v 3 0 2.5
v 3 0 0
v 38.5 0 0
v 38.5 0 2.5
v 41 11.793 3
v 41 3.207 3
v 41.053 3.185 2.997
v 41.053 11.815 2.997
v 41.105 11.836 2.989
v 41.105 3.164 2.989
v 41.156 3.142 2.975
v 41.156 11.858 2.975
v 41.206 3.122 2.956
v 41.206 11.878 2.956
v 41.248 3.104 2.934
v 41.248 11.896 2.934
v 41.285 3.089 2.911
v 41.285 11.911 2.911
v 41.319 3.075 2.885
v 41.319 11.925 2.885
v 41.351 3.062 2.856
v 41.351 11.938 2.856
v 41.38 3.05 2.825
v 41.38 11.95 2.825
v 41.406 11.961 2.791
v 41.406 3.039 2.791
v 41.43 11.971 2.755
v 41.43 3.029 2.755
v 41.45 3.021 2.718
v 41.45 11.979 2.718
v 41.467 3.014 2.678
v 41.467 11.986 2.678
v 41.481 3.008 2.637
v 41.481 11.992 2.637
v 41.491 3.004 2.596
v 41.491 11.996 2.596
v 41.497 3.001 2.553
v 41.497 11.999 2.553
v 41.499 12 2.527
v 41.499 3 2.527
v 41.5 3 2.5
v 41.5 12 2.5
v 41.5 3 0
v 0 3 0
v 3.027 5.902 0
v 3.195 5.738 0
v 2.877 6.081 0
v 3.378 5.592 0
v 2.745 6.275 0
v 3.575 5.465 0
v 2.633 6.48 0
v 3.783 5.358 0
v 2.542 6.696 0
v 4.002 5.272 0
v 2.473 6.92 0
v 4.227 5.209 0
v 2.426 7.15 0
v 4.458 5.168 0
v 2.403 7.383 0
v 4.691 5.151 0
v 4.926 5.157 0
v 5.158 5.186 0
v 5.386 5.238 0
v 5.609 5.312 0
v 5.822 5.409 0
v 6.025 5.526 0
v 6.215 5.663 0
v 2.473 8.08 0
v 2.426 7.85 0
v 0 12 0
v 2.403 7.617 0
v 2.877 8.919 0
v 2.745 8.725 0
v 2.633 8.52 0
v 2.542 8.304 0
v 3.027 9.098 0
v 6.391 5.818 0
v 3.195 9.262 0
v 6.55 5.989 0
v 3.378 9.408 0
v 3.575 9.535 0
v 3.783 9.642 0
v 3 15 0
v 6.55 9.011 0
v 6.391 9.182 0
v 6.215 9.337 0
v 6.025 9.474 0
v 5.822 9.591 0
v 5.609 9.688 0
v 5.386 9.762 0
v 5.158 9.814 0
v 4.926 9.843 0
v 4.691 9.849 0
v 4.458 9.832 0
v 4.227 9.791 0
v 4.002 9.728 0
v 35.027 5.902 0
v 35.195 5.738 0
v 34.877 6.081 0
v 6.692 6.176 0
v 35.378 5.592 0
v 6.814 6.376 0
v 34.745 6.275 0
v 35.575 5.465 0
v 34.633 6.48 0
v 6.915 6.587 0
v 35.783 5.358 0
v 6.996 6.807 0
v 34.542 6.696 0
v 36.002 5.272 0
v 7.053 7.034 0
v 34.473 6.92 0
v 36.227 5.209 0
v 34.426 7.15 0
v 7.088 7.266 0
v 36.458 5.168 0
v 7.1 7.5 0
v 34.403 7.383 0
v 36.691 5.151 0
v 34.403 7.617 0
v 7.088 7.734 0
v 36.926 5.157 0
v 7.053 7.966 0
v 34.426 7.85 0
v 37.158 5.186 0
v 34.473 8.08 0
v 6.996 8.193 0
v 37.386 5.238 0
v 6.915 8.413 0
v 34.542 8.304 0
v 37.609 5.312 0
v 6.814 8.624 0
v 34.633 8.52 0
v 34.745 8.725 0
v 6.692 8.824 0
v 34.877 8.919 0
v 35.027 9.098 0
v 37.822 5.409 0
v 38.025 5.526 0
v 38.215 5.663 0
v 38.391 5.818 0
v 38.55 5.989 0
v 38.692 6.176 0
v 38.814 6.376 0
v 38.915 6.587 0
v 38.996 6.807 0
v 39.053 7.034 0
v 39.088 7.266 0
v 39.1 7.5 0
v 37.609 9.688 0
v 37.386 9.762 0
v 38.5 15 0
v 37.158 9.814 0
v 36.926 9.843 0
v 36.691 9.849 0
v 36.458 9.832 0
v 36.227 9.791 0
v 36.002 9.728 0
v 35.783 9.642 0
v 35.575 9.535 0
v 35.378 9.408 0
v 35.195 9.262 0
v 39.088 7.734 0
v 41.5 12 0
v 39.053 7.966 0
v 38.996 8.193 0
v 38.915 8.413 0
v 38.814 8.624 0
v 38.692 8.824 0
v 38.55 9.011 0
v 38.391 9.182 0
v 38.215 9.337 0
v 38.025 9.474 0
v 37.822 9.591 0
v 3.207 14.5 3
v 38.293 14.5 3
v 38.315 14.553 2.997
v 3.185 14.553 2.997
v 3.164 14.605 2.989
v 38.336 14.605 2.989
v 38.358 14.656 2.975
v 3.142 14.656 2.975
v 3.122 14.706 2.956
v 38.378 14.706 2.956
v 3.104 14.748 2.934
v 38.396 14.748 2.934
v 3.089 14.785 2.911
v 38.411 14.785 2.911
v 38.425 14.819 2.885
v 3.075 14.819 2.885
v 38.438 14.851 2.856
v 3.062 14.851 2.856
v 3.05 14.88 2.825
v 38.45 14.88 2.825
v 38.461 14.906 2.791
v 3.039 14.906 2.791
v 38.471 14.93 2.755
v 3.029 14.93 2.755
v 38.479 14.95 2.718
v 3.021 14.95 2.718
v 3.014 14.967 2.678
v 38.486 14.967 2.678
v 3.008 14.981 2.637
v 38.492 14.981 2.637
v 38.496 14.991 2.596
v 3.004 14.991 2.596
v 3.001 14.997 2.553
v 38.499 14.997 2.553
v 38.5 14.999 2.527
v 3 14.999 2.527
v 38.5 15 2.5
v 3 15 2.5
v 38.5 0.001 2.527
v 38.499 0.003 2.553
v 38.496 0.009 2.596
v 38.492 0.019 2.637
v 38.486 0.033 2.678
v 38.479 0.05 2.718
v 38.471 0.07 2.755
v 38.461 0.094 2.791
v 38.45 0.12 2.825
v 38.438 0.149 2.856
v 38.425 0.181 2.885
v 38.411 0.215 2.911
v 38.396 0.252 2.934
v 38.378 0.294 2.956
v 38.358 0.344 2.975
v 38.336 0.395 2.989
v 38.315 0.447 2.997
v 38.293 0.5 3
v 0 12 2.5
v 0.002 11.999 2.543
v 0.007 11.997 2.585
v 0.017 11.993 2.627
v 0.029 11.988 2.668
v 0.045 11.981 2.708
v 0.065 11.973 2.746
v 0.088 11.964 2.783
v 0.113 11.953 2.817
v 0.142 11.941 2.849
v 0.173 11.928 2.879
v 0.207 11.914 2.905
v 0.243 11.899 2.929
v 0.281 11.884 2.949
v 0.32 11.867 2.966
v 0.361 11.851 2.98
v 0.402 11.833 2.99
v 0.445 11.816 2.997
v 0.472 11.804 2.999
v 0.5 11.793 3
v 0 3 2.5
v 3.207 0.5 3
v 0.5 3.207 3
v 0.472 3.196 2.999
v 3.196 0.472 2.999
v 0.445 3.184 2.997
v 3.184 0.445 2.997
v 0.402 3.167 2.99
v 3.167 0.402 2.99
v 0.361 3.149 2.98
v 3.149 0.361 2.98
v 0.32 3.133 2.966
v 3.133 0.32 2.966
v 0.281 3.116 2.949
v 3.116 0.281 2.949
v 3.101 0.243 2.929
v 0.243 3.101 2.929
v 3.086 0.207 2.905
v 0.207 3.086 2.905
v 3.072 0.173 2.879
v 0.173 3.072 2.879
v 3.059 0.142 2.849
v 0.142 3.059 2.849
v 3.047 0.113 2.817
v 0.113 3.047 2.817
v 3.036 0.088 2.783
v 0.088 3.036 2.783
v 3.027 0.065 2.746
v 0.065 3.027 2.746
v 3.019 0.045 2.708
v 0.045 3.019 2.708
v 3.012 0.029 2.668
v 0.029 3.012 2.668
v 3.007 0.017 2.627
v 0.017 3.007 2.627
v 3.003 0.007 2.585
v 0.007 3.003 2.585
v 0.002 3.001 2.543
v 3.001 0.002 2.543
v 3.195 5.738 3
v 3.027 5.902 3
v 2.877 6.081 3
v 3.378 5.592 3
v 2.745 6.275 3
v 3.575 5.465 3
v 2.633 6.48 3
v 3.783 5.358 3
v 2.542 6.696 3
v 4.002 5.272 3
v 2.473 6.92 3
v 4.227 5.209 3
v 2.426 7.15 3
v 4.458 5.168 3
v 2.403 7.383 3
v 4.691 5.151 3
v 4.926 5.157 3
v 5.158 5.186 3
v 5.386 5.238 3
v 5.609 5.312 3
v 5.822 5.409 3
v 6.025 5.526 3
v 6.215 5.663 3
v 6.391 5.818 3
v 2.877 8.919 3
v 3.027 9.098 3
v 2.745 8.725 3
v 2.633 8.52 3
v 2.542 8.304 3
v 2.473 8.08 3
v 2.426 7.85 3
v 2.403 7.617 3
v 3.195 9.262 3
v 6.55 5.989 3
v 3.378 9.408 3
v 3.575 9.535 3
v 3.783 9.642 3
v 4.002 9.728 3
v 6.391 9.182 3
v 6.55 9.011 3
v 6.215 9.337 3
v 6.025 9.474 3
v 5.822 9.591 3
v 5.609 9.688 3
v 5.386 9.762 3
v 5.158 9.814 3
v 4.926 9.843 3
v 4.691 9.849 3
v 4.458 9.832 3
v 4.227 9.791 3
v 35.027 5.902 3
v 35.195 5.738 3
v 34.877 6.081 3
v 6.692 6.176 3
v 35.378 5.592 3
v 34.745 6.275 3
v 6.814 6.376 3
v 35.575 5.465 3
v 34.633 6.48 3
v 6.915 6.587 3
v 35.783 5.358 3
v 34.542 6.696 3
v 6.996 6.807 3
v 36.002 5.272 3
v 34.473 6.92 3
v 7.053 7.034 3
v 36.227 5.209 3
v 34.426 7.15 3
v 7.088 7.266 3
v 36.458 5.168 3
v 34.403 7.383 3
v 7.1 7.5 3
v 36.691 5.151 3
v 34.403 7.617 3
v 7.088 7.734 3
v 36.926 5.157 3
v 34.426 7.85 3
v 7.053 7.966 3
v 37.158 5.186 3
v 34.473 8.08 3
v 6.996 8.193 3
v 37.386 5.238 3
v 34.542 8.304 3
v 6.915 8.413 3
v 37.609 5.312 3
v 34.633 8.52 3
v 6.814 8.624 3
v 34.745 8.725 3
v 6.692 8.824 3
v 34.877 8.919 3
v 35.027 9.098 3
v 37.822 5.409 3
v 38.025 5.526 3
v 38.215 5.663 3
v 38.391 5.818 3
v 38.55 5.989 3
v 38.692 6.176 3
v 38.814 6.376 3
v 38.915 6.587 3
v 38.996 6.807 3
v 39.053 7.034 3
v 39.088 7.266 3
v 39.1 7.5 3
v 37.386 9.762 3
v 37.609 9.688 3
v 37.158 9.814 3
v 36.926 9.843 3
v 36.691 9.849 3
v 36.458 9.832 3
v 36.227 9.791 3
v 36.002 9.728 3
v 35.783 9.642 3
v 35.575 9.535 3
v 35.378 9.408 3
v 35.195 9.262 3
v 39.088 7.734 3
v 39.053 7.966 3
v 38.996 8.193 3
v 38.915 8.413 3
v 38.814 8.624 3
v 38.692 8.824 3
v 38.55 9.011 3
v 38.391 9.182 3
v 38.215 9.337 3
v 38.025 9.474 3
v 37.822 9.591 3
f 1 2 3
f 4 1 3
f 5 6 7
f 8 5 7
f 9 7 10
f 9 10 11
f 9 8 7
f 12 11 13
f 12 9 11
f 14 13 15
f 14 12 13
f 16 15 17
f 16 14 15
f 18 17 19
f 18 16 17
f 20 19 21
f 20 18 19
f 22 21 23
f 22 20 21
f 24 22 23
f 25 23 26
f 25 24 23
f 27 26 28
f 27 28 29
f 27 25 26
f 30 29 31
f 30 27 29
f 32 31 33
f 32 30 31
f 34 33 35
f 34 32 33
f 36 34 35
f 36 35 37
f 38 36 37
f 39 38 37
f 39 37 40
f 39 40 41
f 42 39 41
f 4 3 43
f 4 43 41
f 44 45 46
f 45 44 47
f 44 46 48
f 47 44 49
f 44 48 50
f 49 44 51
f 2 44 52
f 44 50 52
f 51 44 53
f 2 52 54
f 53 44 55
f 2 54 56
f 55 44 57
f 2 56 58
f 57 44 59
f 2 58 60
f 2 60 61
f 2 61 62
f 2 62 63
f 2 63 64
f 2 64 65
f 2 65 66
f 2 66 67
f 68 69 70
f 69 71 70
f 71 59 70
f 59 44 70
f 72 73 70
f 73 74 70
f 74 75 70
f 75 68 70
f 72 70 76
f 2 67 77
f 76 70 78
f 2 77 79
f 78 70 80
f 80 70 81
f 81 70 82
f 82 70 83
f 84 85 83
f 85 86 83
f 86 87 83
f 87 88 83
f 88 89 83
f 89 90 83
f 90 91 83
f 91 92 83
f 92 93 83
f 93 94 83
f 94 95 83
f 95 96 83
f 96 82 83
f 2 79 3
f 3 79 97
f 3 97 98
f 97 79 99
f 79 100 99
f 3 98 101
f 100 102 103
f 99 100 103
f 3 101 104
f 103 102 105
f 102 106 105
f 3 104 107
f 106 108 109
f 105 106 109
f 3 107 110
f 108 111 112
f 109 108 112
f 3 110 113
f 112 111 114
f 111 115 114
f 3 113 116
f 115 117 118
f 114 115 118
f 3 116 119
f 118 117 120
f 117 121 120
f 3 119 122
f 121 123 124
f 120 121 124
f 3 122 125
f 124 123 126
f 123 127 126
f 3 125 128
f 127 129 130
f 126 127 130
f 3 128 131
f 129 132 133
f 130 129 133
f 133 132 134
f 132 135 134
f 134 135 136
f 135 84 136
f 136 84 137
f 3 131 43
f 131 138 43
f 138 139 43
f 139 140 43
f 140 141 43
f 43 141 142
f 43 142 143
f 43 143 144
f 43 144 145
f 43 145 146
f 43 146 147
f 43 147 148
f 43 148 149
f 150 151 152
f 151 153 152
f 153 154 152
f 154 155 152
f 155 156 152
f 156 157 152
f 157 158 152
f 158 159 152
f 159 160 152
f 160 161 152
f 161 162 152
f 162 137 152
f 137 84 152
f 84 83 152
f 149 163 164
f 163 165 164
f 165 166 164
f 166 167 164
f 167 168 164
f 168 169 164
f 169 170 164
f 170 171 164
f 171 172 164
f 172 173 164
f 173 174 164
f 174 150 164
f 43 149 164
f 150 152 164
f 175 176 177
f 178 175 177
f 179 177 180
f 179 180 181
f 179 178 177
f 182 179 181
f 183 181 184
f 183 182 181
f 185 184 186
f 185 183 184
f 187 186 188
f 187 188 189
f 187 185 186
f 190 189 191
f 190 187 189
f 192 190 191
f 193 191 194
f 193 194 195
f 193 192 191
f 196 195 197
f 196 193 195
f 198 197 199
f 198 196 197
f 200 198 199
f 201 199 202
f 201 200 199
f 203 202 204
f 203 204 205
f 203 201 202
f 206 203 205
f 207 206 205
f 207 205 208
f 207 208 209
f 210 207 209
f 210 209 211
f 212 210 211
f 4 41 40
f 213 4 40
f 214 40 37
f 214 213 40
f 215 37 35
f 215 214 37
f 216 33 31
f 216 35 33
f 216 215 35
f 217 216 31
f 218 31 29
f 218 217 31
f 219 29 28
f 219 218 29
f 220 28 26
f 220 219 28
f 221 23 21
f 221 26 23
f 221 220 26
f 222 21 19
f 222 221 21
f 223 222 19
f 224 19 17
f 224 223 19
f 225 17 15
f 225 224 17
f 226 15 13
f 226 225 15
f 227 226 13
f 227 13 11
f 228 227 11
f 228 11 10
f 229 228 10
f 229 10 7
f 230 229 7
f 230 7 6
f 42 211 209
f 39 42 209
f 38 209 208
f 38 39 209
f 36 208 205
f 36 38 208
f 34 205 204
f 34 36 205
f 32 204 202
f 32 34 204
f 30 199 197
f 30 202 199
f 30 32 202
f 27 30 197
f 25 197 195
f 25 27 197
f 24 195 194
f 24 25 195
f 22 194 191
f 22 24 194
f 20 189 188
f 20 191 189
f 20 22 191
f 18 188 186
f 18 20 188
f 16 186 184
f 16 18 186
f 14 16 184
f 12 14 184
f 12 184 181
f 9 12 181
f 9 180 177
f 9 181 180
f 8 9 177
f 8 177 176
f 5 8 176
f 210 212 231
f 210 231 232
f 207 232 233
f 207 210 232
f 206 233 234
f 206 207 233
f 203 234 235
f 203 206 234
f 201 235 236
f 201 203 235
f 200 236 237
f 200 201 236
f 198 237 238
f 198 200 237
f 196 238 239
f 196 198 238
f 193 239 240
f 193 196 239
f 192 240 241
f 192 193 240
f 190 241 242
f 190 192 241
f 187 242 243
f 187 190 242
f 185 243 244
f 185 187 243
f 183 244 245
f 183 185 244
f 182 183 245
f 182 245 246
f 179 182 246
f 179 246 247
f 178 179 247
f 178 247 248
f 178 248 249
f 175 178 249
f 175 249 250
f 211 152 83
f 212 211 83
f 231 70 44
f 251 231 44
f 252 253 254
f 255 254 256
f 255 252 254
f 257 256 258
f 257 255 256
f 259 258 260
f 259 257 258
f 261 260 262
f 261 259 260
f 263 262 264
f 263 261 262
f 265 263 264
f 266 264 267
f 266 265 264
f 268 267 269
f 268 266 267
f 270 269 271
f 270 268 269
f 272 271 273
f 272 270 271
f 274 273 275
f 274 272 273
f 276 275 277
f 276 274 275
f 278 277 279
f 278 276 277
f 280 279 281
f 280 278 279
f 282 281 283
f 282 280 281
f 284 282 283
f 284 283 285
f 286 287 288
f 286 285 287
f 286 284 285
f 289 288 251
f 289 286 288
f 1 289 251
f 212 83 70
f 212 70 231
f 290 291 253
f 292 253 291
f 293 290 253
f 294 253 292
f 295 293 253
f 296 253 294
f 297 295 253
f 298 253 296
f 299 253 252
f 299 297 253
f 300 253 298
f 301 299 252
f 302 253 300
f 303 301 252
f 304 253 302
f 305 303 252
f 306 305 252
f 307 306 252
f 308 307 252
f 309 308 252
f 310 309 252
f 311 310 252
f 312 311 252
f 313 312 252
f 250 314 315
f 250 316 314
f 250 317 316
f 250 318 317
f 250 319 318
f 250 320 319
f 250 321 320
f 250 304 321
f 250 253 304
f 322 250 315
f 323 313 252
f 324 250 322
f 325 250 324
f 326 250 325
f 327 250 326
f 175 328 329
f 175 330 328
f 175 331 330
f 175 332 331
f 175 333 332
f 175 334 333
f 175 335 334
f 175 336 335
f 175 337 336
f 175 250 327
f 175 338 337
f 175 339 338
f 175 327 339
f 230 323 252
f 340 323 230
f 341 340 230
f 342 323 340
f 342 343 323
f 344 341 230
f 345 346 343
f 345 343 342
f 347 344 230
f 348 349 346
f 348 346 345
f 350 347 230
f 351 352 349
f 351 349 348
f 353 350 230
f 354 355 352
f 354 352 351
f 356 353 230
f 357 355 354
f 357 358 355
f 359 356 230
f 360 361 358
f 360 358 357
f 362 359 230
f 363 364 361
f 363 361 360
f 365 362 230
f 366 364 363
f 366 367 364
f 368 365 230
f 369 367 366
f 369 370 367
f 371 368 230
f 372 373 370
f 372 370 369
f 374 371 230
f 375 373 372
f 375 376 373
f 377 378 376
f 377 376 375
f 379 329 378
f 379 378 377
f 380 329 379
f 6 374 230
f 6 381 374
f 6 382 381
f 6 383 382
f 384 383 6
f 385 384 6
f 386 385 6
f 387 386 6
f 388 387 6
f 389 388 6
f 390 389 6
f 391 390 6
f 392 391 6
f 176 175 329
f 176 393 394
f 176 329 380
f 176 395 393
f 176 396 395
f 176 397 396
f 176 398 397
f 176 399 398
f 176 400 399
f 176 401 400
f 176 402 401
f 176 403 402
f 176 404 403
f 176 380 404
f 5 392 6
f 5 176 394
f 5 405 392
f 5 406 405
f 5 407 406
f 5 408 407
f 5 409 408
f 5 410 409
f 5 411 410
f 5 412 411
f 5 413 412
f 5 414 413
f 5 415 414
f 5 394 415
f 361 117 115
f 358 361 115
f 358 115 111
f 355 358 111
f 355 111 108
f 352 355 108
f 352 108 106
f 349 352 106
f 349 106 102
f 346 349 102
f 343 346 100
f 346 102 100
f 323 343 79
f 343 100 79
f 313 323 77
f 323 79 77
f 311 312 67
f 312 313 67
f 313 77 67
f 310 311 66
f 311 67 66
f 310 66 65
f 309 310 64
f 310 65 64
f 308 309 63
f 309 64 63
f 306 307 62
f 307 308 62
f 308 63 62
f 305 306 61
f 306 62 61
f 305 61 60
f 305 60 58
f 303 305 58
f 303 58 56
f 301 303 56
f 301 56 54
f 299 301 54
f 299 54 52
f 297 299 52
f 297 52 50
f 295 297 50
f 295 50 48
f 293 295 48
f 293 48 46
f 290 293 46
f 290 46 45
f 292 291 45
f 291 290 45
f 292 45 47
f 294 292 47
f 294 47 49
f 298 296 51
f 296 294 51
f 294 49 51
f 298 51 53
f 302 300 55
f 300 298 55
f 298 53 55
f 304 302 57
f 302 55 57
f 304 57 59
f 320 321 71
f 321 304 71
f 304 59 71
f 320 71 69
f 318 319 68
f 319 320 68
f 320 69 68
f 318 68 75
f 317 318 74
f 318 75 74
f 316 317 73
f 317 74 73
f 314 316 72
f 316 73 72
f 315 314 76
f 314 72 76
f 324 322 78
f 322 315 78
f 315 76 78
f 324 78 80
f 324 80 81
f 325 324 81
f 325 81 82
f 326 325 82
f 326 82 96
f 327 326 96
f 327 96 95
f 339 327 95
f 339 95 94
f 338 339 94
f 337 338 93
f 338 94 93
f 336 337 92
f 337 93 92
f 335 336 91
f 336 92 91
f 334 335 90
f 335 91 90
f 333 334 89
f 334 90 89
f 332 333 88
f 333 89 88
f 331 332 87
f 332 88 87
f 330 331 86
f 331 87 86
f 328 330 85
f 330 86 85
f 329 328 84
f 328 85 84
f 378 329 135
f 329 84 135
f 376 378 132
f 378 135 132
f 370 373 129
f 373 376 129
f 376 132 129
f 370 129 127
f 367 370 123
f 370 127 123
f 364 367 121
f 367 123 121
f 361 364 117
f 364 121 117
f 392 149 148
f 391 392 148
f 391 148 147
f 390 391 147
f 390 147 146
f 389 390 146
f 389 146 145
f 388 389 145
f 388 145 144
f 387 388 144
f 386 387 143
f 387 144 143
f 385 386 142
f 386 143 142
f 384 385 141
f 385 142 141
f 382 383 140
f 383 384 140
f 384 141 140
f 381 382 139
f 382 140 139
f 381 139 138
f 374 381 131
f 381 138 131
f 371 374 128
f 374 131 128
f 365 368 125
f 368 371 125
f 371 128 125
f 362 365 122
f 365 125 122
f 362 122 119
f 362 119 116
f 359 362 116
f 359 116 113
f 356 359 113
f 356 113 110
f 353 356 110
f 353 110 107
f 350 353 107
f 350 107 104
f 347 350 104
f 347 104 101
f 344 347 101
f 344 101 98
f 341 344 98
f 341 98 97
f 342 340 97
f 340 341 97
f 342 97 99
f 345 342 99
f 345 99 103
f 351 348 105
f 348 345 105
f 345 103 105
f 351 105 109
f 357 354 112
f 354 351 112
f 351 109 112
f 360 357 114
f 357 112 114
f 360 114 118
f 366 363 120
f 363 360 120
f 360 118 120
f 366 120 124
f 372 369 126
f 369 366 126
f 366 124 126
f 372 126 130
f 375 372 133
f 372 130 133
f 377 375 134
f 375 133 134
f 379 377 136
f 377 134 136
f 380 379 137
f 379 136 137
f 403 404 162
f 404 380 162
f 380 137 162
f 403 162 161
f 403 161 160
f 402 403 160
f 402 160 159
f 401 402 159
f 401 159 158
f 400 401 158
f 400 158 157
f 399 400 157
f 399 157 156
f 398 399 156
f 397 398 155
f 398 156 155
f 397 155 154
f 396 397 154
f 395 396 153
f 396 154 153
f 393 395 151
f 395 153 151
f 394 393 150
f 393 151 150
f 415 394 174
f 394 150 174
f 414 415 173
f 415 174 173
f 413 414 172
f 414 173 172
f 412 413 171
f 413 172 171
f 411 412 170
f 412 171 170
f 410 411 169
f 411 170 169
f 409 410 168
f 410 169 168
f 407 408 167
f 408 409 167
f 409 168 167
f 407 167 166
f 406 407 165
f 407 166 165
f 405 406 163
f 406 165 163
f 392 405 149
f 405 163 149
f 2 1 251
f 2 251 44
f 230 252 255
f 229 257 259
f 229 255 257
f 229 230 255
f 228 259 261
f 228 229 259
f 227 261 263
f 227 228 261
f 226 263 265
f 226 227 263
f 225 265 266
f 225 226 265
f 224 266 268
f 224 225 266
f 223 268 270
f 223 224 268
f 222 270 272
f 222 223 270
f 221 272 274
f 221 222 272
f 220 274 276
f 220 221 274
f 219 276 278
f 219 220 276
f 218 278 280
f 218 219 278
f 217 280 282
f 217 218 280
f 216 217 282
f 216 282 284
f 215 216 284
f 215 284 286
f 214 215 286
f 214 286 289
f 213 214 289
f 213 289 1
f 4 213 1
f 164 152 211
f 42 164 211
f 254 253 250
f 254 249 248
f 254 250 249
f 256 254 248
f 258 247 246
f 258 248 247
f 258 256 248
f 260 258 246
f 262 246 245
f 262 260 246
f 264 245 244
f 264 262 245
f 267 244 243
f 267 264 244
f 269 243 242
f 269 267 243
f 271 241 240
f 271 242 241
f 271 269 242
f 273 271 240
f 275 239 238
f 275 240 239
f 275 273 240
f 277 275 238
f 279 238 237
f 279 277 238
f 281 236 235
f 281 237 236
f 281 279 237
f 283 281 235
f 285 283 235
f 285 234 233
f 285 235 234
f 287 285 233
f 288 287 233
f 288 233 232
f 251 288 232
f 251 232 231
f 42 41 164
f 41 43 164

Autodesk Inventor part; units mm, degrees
ref_plane "YZ Plane" through (0, 0, 0) normal (1, 0, 0) x (0, 1, 0)
ref_plane "XZ Plane" through (0, 0, 0) normal (0, 1, 0) x (-1, 0, 0)
ref_plane "XY Plane" through (0, 0, 0) normal (0, 0, 1) x (1, 0, 0)
sketch "Sketch1" plane through (0, 0, 0) normal (0, 0, 1) x (1, 0, 0)
  line L0 (0, 0) -> (41.5, 0)
  line L1 (41.5, 0) -> (41.5, 15)
  line L2 (41.5, 15) -> (0, 15)
  line L3 (0, 15) -> (0, 0)
  line L4 (0, 7.5) -> (41.5, 7.5) construction
  line L5 (20.75, 15) -> (20.75, 0) construction
  circle A0 centre (20.75, 7.5) radius 16 construction
  circle A1 centre (4.75, 7.5) radius 2.35
  circle A2 centre (36.75, 7.5) radius 2.35
  dimension "d0" = 41.5
  dimension "d1" = 15
  dimension "d2" = 32
  dimension "d3" = 4.7
  dimension "d4" = 4.7
extrude "Extrusion1" add sketch "Sketch1" along normal blind 3
chamfer "Chamfer1" distance 3 angle 45 4 edges at (0, 15, 1.5) (41.5, 15, 1.5) (41.5, 0, 1.5) (0, 0, 1.5)
fillet "Fillet1" radius 0.5 8 edges at (1.5, 1.5, 3) (20.75, 0, 3) (40, 1.5, 3) (41.5, 7.5, 3) (40, 13.5, 3) (20.75, 15, 3) (1.5, 13.5, 3) (0, 7.5, 3)
properties part number "MagneticLimitBaseSpacer3milTall"
